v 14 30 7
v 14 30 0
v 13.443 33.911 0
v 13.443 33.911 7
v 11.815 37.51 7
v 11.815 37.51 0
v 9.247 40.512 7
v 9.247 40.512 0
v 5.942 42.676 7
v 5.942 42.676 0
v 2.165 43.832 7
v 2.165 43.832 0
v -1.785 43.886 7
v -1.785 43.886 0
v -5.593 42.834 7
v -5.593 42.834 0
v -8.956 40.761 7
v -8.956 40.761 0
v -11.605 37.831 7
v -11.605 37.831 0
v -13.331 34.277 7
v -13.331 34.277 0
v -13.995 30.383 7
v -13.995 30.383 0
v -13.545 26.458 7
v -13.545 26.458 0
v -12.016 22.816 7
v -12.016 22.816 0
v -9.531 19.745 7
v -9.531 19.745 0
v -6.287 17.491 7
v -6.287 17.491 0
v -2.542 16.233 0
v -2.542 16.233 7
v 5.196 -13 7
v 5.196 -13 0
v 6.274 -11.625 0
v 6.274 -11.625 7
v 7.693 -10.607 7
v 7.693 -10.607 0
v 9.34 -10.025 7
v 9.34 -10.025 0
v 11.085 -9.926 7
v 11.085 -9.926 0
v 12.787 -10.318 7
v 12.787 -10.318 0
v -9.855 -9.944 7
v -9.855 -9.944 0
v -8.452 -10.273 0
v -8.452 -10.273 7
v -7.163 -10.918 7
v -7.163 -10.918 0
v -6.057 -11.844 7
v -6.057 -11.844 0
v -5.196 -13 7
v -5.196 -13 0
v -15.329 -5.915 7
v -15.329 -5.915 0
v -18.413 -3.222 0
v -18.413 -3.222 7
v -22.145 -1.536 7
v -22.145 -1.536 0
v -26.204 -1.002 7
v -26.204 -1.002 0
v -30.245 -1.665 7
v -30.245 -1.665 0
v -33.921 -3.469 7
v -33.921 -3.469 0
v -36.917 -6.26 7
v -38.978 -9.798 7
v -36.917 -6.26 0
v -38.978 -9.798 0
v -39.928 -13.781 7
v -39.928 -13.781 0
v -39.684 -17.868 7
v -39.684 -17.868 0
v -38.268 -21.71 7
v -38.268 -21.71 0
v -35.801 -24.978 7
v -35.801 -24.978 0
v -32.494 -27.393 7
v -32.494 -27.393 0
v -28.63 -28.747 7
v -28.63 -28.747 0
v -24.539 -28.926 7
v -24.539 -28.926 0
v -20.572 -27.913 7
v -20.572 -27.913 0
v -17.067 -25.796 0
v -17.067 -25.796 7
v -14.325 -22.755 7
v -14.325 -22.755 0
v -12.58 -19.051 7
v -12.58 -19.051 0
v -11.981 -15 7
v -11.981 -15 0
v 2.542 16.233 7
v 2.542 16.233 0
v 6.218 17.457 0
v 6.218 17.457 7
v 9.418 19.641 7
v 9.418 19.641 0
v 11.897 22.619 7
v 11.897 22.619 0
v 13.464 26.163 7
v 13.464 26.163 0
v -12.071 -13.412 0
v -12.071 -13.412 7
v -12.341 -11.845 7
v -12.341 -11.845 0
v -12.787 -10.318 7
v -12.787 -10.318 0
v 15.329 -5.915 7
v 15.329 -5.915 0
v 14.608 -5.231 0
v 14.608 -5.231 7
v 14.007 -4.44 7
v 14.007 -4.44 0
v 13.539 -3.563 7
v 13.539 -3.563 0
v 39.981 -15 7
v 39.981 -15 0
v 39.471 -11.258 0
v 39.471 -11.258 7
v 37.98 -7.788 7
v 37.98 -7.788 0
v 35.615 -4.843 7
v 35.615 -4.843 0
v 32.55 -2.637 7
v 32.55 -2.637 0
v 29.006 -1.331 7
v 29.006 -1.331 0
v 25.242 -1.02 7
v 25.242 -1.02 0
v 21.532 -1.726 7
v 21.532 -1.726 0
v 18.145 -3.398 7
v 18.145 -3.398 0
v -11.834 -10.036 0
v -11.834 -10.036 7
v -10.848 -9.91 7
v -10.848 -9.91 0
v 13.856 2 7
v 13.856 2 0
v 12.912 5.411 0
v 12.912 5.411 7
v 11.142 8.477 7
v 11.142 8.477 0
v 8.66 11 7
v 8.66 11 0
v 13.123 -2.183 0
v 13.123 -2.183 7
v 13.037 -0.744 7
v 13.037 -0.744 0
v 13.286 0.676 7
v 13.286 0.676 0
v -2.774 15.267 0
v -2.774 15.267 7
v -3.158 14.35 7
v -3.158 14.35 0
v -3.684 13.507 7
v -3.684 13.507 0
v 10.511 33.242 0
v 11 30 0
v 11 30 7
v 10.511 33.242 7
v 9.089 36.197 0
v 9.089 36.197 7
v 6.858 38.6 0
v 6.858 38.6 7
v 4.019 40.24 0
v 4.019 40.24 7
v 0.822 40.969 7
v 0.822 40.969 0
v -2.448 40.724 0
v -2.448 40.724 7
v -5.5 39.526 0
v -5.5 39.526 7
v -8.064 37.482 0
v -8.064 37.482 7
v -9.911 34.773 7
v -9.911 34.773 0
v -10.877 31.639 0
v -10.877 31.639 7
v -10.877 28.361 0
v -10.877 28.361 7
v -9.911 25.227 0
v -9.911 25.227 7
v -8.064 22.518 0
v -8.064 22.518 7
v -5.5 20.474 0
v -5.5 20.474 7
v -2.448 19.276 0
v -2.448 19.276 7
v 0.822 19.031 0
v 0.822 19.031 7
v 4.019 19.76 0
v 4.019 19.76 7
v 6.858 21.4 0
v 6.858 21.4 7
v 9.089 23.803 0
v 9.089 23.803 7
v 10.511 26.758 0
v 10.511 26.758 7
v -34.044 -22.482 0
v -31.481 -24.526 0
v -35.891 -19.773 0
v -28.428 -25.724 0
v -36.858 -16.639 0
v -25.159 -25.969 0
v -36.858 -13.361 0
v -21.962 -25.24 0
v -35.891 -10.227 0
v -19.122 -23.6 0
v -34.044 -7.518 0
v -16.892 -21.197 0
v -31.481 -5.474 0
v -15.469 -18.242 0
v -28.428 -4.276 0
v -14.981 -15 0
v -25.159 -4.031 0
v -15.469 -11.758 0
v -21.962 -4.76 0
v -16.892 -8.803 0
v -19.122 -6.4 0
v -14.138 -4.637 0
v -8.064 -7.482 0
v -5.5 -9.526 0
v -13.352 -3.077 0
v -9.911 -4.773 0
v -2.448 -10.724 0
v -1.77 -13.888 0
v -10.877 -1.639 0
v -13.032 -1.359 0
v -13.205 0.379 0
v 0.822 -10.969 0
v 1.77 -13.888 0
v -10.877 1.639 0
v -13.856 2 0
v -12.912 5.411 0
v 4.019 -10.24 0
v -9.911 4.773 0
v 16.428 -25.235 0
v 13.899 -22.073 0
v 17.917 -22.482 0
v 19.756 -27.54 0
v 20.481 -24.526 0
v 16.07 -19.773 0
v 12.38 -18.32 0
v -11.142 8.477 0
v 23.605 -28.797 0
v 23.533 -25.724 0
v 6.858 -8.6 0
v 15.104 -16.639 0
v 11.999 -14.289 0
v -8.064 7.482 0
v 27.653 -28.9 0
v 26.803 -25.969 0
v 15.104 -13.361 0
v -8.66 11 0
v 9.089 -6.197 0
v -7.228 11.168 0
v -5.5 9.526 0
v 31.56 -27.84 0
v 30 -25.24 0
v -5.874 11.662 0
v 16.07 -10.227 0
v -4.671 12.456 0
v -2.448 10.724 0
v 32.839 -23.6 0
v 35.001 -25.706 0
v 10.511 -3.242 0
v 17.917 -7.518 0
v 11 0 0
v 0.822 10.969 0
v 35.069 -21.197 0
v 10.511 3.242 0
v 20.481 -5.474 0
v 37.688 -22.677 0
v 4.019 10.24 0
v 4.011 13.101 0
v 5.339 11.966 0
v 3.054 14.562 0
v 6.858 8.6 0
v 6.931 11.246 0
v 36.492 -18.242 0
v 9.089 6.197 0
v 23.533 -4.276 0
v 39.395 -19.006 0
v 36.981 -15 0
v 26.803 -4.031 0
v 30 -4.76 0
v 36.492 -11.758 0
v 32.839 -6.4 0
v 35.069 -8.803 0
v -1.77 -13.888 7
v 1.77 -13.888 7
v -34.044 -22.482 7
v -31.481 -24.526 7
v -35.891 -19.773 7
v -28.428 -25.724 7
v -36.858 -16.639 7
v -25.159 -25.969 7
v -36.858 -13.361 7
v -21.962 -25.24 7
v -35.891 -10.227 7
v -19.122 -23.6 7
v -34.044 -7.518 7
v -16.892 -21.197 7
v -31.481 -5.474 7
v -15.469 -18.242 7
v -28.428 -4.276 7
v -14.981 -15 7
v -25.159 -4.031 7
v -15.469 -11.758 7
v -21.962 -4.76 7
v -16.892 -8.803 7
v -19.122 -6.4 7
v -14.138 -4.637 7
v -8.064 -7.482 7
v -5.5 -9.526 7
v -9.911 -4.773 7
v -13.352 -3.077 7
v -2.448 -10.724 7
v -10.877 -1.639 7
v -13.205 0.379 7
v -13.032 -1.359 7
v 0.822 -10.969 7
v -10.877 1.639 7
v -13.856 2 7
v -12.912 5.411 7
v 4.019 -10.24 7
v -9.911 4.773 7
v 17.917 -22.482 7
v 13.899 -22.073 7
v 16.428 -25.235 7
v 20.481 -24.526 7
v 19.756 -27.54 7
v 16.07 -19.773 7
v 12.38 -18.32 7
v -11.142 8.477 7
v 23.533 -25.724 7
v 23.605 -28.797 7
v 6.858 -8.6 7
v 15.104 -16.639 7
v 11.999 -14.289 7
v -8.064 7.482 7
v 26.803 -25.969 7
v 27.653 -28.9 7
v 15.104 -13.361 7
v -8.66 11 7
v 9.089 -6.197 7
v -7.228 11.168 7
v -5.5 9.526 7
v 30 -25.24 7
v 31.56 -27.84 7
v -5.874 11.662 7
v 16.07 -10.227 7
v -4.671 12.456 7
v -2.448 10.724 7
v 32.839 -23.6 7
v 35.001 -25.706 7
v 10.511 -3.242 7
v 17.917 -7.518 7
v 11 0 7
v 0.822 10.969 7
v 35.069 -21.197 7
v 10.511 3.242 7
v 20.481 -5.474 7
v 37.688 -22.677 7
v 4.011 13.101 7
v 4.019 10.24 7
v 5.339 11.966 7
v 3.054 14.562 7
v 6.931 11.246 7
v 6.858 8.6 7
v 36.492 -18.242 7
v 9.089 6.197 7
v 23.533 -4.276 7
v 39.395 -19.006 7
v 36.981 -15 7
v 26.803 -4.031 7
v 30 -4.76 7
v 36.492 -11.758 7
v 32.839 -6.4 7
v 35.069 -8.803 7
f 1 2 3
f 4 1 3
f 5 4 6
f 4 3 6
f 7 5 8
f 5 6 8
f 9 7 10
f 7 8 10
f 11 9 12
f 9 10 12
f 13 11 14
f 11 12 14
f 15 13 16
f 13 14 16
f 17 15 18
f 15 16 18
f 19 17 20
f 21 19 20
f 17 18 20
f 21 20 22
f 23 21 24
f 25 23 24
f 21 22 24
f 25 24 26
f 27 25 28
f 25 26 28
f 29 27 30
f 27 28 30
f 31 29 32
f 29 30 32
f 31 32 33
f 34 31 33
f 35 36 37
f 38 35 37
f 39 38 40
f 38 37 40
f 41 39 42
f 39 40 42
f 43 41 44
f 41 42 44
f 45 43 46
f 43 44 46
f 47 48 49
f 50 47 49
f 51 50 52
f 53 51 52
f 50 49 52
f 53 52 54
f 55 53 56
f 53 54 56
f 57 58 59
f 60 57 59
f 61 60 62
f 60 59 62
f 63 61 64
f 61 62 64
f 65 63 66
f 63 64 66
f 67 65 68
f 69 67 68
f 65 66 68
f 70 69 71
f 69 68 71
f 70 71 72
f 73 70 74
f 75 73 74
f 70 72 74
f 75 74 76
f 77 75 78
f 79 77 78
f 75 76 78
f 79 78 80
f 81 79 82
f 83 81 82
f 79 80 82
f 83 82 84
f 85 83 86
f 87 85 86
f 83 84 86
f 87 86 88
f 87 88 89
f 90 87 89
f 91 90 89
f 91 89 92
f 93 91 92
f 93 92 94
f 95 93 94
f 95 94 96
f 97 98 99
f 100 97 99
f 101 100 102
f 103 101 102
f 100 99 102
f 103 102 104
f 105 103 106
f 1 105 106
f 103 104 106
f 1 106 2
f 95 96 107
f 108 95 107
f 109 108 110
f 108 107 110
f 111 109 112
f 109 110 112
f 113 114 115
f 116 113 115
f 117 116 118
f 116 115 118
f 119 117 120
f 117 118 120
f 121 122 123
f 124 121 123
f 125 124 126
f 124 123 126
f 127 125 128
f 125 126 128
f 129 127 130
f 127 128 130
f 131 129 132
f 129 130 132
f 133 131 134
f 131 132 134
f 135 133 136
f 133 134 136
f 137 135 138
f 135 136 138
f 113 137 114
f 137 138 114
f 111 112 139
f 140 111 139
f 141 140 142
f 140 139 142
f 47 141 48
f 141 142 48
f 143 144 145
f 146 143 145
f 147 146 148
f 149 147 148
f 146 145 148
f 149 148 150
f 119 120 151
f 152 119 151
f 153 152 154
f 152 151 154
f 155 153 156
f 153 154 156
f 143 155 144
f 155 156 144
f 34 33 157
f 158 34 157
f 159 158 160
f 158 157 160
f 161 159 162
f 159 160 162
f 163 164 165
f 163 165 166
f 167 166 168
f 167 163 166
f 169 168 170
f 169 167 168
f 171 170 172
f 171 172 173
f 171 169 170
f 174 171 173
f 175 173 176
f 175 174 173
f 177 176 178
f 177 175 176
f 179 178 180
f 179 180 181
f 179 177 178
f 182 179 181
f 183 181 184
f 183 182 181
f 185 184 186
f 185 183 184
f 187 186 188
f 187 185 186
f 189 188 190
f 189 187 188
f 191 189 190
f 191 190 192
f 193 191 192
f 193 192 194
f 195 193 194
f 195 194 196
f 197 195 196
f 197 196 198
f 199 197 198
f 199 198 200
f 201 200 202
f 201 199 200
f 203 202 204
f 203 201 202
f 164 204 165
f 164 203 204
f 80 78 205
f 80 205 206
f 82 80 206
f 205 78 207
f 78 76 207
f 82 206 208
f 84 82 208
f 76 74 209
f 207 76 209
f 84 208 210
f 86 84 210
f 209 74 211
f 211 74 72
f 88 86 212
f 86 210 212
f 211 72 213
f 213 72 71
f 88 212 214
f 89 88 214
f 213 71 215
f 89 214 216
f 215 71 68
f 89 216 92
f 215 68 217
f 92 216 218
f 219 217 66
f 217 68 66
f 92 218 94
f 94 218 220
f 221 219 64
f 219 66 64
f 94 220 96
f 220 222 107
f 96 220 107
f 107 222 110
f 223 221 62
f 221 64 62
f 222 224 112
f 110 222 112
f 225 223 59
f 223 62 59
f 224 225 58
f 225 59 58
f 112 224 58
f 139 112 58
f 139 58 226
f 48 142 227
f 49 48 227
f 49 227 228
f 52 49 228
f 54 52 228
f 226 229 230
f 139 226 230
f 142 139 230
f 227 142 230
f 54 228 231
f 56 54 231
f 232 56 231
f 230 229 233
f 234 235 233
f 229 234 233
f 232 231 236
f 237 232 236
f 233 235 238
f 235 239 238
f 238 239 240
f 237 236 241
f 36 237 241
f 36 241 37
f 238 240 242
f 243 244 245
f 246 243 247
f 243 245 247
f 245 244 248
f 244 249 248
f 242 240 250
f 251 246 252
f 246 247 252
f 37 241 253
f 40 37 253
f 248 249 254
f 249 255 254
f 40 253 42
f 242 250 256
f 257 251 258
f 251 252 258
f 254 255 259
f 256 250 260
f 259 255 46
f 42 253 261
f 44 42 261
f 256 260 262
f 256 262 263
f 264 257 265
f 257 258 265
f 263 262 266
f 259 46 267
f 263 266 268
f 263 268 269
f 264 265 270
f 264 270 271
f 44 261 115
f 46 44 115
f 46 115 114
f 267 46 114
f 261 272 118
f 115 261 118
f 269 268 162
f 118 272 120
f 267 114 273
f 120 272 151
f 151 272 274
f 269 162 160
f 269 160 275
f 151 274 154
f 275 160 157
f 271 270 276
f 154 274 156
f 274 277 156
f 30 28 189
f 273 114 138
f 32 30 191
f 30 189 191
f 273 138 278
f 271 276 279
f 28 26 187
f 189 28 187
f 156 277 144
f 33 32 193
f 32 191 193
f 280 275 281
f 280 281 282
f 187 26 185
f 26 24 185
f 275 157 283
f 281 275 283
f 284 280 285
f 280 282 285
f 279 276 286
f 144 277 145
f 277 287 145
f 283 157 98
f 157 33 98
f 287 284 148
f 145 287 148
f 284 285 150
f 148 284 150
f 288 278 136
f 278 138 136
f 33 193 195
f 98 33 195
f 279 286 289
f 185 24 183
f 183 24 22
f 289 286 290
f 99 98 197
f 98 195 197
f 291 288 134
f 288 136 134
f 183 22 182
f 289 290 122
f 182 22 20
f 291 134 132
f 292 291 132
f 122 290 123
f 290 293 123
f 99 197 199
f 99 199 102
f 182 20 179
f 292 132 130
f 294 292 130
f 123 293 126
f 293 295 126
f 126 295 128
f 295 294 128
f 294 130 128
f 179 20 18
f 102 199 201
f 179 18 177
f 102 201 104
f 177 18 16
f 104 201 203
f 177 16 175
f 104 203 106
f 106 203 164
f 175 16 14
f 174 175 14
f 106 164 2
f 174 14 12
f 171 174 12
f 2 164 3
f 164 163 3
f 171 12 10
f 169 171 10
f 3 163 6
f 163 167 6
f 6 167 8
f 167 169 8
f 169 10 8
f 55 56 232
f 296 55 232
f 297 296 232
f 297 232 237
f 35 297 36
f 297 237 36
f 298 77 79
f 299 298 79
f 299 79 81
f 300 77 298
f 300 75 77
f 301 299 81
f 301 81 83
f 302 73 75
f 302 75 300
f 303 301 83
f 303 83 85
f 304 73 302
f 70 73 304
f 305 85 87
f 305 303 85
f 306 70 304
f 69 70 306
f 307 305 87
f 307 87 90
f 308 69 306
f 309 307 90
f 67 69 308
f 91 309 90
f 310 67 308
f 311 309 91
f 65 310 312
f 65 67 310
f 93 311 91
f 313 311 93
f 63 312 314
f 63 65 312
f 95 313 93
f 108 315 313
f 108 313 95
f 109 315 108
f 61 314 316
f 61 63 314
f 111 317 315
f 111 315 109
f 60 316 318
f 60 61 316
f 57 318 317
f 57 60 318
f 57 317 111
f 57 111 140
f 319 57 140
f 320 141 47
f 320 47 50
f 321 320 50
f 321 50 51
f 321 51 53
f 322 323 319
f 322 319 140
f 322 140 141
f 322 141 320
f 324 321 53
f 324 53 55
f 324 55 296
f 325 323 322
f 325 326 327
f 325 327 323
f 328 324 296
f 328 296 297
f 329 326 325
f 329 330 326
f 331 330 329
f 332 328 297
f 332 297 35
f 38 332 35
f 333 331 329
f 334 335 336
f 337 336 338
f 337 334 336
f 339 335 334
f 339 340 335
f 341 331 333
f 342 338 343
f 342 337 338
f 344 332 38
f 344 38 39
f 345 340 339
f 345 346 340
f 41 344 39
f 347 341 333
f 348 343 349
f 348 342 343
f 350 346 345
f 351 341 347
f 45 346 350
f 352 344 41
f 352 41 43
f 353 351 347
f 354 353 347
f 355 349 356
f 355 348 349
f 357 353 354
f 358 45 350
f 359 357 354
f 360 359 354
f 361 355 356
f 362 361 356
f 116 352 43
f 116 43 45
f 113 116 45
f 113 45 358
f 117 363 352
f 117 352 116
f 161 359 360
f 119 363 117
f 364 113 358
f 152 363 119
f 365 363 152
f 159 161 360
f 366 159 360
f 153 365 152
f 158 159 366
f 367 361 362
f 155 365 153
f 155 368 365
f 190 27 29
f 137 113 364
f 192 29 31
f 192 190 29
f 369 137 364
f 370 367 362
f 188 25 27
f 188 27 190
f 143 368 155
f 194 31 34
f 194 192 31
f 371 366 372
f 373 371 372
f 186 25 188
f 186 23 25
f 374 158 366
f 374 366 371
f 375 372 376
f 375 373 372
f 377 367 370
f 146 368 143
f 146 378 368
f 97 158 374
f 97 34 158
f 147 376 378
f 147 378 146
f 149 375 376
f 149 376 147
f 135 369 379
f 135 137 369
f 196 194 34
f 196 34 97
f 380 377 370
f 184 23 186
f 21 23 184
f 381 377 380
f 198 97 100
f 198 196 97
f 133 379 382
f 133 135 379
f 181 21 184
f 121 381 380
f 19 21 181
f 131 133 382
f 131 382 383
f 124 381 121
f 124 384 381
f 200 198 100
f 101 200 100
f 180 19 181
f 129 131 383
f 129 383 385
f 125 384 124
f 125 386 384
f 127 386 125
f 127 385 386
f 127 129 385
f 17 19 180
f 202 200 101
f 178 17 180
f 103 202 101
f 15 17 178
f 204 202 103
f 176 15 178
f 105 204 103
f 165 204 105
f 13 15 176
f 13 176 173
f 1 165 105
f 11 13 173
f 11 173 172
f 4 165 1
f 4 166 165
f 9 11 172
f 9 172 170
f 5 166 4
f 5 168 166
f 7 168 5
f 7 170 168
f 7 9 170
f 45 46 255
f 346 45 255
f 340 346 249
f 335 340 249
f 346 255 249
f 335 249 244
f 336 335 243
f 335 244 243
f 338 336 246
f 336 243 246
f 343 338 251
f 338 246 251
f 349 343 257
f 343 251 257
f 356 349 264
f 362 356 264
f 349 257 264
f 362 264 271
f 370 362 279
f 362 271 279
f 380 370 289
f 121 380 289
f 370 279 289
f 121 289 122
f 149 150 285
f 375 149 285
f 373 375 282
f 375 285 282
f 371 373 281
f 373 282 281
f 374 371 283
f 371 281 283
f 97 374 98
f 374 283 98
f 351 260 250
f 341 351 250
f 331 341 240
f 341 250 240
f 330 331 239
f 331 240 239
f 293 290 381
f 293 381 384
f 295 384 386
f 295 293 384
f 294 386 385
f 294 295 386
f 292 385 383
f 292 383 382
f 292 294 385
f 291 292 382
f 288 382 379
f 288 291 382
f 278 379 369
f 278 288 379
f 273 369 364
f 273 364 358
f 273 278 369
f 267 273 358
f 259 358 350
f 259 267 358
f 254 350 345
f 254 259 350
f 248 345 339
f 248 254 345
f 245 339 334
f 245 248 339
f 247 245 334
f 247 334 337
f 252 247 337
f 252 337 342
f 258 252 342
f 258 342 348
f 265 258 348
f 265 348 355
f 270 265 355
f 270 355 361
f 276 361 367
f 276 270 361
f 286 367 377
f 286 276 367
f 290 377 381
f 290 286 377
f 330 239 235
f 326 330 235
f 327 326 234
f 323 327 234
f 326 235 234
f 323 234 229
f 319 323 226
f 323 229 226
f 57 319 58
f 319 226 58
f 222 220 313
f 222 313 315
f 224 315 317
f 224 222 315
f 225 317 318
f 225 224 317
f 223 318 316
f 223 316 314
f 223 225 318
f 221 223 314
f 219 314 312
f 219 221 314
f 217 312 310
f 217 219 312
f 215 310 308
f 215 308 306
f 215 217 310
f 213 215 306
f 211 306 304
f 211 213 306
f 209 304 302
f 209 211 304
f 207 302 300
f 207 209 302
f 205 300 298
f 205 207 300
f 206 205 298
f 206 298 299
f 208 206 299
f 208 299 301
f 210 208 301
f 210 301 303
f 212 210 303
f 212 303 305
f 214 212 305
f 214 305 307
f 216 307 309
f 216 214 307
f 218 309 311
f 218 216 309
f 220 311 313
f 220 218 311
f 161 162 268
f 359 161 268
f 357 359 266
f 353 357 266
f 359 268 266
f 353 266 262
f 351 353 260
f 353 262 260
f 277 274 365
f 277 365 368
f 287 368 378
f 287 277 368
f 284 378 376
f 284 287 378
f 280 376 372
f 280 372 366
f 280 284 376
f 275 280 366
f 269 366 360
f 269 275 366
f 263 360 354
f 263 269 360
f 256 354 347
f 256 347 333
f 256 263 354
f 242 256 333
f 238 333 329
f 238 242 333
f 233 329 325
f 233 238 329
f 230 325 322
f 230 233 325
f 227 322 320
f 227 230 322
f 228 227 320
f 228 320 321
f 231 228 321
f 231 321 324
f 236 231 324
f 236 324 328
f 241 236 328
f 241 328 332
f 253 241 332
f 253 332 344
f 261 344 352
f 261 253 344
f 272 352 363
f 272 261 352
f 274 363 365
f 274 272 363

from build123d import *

# Parameters (mm, degrees)
F0_R     = 11
F1_DEPTH = 7


with BuildPart() as f1:
    # F0 (on Top) → F1 (new body)
    with BuildSketch(Plane.XY):
        with BuildLine():
            Line((14.05794, -8.116355), (15.328937, -5.914923))
            ThreePointArc((15.328937, -5.914923), (13.856406, -8), (12.786942, -10.317787))
            Line((12.786942, -10.317787), (14.05794, -8.116355))
        make_face()
        with BuildLine():
            ThreePointArc((39.980762, -15), (30.821963, -1.863685), (15.328937, -5.914923))
            Line((15.328937, -5.914923), (14.05794, -8.116355))
            Line((14.05794, -8.116355), (12.786942, -10.317787))
            ThreePointArc((12.786942, -10.317787), (23.605207, -28.796983), (39.980762, -15))
        make_face()
        with Locations((25.980762, -15)):
            Circle(F0_R, mode=Mode.SUBTRACT)
        with BuildLine():
            ThreePointArc((2.541994, 16.23271), (0, 16), (-2.541994, 16.23271))
            ThreePointArc((-2.541994, 16.23271), (-2.9479, 14.800569), (-3.683807, 13.506649))
            ThreePointArc((-3.683807, 13.506649), (-5.874203, 11.662049), (-8.660254, 11))
            ThreePointArc((-8.660254, 11), (-12.124356, 7), (-13.856406, 2))
            ThreePointArc((-13.856406, 2), (-13.131153, -2.22937), (-15.328937, -5.914923))
            ThreePointArc((-15.328937, -5.914923), (-13.856406, -8), (-12.786942, -10.317787))
            ThreePointArc((-12.786942, -10.317787), (-11.343719, -9.953241), (-9.855198, -9.943595))
            ThreePointArc((-9.855198, -9.943595), (-7.162529, -10.918233), (-5.196152, -13))
            ThreePointArc((-5.196152, -13), (0, -14), (5.196152, -13))
            ThreePointArc((5.196152, -13), (8.496267, -10.257227), (12.786942, -10.317787))
            ThreePointArc((12.786942, -10.317787), (13.856406, -8), (15.328937, -5.914923))
            ThreePointArc((15.328937, -5.914923), (14.291619, -4.847328), (13.539005, -3.563054))
            ThreePointArc((13.539005, -3.563054), (13.036732, -0.743815), (13.856406, 2))
            ThreePointArc((13.856406, 2), (12.124356, 7), (8.660254, 11))
            ThreePointArc((8.660254, 11), (4.634886, 12.486597), (2.541994, 16.23271))
        make_face()
        Circle(F0_R, mode=Mode.SUBTRACT)
        with BuildLine():
            ThreePointArc((-12.786942, -10.317787), (-13.856406, -8), (-15.328937, -5.914923))
            Line((-15.328937, -5.914923), (-14.05794, -8.116355))
            Line((-14.05794, -8.116355), (-12.786942, -10.317787))
        make_face()
        with BuildLine():
            Line((-14.05794, -8.116355), (-15.328937, -5.914923))
            ThreePointArc((-15.328937, -5.914923), (-39.117077, -19.8412), (-11.980762, -15))
            ThreePointArc((-11.980762, -15), (-12.183779, -12.624445), (-12.786942, -10.317787))
            Line((-12.786942, -10.317787), (-14.05794, -8.116355))
        make_face()
        with Locations((-25.980762, -15)):
            Circle(F0_R, mode=Mode.SUBTRACT)
        with BuildLine():
            ThreePointArc((2.541994, 16.23271), (10.76076, 21.044218), (14, 30))
            ThreePointArc((14, 30), (-8.955782, 40.76076), (-2.541994, 16.23271))
            Line((-2.541994, 16.23271), (0, 16.23271))
            Line((0, 16.23271), (2.541994, 16.23271))
        make_face()
        with Locations((0, 30)):
            Circle(F0_R, mode=Mode.SUBTRACT)
        with BuildLine():
            Line((0, 16.23271), (-2.541994, 16.23271))
            ThreePointArc((-2.541994, 16.23271), (0, 16), (2.541994, 16.23271))
            Line((2.541994, 16.23271), (0, 16.23271))
        make_face()
    extrude(amount=F1_DEPTH)


solid = f1.part
